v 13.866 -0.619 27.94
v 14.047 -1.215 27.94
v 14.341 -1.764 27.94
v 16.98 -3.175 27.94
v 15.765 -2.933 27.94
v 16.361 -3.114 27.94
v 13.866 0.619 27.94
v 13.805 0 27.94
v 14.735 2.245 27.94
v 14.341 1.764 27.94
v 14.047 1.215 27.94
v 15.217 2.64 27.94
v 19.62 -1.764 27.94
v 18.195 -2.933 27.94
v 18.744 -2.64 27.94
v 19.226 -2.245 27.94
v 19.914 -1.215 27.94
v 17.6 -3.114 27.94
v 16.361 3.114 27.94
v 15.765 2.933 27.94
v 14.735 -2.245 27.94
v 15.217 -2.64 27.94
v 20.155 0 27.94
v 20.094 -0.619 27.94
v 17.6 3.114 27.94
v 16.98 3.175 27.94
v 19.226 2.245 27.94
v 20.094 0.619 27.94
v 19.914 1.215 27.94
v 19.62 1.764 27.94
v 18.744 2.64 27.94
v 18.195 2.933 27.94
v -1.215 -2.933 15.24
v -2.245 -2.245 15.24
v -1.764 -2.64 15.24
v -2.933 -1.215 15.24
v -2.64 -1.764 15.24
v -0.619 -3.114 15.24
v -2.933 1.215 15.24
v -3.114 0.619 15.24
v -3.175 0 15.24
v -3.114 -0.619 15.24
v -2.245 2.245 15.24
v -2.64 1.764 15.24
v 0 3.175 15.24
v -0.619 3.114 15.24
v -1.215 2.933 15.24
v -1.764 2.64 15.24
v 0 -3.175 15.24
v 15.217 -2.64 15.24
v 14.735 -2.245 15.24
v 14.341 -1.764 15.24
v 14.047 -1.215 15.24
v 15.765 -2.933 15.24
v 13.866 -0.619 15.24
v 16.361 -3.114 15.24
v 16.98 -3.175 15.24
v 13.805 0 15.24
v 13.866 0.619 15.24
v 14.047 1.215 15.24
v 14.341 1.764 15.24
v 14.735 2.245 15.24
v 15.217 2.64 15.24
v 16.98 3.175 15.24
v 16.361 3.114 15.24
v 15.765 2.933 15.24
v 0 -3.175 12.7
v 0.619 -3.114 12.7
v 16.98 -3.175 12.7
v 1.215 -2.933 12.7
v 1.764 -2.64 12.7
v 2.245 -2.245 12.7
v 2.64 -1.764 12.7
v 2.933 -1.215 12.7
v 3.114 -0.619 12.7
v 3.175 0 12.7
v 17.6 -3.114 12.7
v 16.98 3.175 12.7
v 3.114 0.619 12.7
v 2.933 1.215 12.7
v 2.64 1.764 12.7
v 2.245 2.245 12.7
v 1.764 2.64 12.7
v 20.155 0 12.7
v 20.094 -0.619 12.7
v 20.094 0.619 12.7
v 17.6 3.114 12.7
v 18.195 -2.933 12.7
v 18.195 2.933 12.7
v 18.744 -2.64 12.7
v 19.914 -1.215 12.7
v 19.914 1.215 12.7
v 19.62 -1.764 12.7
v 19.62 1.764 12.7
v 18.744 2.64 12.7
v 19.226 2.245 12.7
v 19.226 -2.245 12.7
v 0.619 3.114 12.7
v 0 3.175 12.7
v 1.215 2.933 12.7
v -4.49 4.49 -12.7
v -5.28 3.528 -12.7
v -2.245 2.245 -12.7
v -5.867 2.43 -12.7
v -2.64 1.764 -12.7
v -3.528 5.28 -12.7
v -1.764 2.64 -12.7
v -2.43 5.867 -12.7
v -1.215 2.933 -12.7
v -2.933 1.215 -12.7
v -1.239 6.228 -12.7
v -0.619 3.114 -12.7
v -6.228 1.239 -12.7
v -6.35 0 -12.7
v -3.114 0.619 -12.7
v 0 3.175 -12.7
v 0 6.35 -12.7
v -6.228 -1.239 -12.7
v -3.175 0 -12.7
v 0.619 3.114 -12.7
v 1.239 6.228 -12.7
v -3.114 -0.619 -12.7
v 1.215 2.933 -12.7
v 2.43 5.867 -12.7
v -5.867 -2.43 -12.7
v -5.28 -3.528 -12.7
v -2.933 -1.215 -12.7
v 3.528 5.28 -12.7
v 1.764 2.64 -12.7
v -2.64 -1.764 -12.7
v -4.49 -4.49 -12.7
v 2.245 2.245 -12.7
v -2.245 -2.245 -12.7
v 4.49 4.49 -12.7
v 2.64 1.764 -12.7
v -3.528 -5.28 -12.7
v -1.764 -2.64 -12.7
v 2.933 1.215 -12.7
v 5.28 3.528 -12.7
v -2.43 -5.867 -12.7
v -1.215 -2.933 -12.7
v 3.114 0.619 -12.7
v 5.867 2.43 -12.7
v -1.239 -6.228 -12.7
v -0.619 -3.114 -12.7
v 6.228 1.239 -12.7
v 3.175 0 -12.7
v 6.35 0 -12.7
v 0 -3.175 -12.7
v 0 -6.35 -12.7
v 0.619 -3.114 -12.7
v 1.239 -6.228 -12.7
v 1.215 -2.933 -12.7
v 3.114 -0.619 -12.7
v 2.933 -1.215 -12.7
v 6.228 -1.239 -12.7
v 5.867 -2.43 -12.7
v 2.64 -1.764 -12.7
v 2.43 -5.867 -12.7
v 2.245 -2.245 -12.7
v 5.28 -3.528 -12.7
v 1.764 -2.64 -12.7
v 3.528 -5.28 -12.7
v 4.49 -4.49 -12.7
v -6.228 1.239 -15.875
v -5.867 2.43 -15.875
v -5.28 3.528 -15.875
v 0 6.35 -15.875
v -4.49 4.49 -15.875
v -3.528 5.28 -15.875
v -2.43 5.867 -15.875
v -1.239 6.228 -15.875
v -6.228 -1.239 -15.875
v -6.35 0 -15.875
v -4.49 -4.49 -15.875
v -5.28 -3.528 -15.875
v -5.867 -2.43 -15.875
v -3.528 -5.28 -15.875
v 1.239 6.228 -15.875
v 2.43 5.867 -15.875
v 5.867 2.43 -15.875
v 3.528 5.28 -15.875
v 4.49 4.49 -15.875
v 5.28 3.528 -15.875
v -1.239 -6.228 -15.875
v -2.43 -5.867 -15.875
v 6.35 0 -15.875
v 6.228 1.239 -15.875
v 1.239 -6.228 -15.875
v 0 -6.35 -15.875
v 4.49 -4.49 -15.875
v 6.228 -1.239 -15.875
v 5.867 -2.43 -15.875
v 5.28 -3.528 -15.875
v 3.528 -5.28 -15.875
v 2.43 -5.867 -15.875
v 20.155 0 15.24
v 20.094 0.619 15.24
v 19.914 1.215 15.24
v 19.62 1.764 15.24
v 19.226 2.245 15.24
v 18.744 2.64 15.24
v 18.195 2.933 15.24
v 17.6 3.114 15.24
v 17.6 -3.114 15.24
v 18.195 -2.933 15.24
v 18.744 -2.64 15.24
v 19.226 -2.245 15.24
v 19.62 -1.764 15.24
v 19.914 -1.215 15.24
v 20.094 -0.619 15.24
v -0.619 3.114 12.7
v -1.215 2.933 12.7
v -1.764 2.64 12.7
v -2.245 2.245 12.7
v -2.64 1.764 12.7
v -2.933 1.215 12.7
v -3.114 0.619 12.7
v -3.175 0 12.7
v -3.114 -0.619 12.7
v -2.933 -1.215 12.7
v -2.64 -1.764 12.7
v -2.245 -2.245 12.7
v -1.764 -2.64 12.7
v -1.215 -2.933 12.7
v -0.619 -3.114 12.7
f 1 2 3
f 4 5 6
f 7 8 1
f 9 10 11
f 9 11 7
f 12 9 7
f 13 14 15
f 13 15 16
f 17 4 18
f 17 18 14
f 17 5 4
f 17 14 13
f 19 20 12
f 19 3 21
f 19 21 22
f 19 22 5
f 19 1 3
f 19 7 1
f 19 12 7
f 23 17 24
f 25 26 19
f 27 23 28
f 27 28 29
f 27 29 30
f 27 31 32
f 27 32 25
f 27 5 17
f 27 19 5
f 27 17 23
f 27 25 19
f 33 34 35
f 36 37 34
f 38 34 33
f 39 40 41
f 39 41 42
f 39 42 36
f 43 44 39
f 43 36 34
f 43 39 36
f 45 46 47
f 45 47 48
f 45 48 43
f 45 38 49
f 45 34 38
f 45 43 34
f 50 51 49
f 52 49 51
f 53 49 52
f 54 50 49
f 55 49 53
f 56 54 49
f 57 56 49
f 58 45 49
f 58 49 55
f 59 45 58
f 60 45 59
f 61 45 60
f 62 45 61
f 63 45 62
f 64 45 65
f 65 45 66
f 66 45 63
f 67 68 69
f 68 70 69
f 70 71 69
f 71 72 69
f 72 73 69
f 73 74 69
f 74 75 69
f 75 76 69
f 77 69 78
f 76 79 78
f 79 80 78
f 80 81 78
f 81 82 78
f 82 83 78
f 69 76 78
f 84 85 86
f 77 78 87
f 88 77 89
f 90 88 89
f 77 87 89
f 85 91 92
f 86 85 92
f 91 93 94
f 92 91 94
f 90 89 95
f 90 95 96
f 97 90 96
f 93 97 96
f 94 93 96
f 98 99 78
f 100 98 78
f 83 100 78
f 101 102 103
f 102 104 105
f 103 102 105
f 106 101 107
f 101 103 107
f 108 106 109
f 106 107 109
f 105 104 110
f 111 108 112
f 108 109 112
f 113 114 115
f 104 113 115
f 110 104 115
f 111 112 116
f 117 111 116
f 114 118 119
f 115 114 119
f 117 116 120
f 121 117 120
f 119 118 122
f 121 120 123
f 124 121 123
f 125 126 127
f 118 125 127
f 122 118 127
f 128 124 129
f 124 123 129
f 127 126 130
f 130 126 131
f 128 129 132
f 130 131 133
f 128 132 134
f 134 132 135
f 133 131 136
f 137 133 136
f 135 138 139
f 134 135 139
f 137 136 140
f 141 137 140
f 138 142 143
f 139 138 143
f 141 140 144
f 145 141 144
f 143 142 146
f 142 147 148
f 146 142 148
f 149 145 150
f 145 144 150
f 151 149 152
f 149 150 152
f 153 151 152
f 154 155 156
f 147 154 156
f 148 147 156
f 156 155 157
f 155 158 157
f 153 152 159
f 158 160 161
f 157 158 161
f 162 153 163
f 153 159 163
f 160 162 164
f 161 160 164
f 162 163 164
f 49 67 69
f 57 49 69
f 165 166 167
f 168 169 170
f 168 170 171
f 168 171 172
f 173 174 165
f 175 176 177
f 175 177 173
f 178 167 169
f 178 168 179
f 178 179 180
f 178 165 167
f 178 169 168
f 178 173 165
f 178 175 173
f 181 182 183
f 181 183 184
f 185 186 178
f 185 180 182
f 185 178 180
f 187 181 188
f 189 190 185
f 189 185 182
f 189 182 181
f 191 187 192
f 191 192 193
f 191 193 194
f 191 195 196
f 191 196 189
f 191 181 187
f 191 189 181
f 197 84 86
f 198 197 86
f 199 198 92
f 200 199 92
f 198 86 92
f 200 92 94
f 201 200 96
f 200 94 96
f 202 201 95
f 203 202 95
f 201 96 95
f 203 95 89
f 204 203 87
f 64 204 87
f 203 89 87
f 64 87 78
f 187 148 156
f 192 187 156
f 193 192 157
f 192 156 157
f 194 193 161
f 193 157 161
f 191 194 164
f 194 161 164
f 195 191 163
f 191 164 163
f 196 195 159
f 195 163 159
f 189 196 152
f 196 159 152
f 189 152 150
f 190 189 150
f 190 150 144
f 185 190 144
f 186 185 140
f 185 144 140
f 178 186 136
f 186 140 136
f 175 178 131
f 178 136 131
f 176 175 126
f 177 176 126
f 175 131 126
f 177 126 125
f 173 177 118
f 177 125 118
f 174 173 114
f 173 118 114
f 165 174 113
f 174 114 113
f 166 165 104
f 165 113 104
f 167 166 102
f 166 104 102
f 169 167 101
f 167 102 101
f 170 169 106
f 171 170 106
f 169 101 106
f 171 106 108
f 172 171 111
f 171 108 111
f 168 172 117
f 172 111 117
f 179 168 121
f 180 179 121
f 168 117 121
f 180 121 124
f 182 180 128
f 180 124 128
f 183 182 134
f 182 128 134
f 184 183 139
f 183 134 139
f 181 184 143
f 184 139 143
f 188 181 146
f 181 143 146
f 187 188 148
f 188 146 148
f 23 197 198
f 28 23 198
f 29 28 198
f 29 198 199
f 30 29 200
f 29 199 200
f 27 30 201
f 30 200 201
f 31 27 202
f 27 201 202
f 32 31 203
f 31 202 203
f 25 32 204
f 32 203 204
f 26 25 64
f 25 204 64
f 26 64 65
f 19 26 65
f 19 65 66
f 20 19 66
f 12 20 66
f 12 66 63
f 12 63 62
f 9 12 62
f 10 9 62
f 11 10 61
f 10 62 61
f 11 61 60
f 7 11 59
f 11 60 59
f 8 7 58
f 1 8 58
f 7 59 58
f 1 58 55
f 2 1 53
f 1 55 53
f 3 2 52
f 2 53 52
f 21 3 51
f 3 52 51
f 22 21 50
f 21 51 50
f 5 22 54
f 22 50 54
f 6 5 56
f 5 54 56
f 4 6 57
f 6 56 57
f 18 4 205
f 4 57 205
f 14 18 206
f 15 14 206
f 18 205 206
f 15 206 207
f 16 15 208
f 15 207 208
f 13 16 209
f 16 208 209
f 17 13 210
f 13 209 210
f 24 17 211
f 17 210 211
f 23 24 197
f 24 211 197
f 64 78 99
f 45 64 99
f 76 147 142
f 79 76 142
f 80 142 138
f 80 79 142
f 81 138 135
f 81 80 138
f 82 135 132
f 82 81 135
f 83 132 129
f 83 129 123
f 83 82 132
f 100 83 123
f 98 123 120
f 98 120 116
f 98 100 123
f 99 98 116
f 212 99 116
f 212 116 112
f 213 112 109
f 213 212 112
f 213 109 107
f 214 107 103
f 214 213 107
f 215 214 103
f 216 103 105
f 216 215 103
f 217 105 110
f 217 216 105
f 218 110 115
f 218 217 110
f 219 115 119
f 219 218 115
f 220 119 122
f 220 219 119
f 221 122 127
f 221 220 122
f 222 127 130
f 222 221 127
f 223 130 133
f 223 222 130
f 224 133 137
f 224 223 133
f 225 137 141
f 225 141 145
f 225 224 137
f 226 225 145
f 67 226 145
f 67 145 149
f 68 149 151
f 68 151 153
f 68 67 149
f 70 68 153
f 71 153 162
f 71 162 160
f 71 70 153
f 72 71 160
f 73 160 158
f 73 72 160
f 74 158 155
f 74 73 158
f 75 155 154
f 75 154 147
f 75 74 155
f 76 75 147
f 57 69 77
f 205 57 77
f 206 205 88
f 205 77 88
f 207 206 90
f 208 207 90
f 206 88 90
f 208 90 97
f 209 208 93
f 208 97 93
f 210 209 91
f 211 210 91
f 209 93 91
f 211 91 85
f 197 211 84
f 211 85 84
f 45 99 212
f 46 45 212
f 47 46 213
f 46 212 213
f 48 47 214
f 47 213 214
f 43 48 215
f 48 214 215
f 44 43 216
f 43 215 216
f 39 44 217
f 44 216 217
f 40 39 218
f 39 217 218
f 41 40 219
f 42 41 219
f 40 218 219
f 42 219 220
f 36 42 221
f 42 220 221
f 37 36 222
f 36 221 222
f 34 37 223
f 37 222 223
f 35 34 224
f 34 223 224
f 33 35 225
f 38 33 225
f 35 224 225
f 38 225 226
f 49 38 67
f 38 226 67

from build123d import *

# Parameters (mm, degrees)
F0_R     = 3.175
F1_DEPTH = 12.7
F2_R     = 6.35
F3_DEPTH = 3.175
F5_DEPTH = 2.54
F6_R     = 3.175
F7_DEPTH = 12.7


with BuildPart() as f1:
    # F0 (on Top) → F1 (new body, symmetric)
    with BuildSketch(Plane.XY):
        Circle(F0_R)
    extrude(amount=F1_DEPTH, both=True)

    # F2 (on face) → F3 (join)
    with BuildSketch(Plane(origin=(0, 0, -12.7), x_dir=(1, 0, 0), z_dir=(0, 0, -1))):
        Circle(F2_R)
    extrude(amount=F3_DEPTH)

    # F4 (on face) → F5 (join)
    with BuildSketch(Plane.XY.offset(12.7)):
        with BuildLine():
            ThreePointArc((16.98045, -3.175), (19.225514, -2.245064), (20.15545, 0))
            ThreePointArc((20.15545, 0), (19.225514, 2.245064), (16.98045, 3.175))
            ThreePointArc((16.98045, 3.175), (13.80545, 0), (16.98045, -3.175))
        make_face()
        with BuildLine():
            ThreePointArc((16.98045, -3.175), (13.80545, 0), (16.98045, 3.175))
            Line((16.98045, 3.175), (0, 3.175))
            ThreePointArc((0, 3.175), (2.245064, 2.245064), (3.175, 0))
            ThreePointArc((3.175, 0), (2.245064, -2.245064), (0, -3.175))
            Line((0, -3.175), (16.98045, -3.175))
        make_face()
        with BuildLine():
            ThreePointArc((3.175, 0), (2.245064, 2.245064), (0, 3.175))
            ThreePointArc((0, 3.175), (-3.175, 0), (0, -3.175))
            ThreePointArc((0, -3.175), (2.245064, -2.245064), (3.175, 0))
        make_face()
    extrude(amount=F5_DEPTH)

    # F6 (on face) → F7 (join)
    with BuildSketch(Plane.XY.offset(15.24)):
        with Locations((16.98045, 0)):
            Circle(F6_R)
    extrude(amount=F7_DEPTH)


solid = f1.part
